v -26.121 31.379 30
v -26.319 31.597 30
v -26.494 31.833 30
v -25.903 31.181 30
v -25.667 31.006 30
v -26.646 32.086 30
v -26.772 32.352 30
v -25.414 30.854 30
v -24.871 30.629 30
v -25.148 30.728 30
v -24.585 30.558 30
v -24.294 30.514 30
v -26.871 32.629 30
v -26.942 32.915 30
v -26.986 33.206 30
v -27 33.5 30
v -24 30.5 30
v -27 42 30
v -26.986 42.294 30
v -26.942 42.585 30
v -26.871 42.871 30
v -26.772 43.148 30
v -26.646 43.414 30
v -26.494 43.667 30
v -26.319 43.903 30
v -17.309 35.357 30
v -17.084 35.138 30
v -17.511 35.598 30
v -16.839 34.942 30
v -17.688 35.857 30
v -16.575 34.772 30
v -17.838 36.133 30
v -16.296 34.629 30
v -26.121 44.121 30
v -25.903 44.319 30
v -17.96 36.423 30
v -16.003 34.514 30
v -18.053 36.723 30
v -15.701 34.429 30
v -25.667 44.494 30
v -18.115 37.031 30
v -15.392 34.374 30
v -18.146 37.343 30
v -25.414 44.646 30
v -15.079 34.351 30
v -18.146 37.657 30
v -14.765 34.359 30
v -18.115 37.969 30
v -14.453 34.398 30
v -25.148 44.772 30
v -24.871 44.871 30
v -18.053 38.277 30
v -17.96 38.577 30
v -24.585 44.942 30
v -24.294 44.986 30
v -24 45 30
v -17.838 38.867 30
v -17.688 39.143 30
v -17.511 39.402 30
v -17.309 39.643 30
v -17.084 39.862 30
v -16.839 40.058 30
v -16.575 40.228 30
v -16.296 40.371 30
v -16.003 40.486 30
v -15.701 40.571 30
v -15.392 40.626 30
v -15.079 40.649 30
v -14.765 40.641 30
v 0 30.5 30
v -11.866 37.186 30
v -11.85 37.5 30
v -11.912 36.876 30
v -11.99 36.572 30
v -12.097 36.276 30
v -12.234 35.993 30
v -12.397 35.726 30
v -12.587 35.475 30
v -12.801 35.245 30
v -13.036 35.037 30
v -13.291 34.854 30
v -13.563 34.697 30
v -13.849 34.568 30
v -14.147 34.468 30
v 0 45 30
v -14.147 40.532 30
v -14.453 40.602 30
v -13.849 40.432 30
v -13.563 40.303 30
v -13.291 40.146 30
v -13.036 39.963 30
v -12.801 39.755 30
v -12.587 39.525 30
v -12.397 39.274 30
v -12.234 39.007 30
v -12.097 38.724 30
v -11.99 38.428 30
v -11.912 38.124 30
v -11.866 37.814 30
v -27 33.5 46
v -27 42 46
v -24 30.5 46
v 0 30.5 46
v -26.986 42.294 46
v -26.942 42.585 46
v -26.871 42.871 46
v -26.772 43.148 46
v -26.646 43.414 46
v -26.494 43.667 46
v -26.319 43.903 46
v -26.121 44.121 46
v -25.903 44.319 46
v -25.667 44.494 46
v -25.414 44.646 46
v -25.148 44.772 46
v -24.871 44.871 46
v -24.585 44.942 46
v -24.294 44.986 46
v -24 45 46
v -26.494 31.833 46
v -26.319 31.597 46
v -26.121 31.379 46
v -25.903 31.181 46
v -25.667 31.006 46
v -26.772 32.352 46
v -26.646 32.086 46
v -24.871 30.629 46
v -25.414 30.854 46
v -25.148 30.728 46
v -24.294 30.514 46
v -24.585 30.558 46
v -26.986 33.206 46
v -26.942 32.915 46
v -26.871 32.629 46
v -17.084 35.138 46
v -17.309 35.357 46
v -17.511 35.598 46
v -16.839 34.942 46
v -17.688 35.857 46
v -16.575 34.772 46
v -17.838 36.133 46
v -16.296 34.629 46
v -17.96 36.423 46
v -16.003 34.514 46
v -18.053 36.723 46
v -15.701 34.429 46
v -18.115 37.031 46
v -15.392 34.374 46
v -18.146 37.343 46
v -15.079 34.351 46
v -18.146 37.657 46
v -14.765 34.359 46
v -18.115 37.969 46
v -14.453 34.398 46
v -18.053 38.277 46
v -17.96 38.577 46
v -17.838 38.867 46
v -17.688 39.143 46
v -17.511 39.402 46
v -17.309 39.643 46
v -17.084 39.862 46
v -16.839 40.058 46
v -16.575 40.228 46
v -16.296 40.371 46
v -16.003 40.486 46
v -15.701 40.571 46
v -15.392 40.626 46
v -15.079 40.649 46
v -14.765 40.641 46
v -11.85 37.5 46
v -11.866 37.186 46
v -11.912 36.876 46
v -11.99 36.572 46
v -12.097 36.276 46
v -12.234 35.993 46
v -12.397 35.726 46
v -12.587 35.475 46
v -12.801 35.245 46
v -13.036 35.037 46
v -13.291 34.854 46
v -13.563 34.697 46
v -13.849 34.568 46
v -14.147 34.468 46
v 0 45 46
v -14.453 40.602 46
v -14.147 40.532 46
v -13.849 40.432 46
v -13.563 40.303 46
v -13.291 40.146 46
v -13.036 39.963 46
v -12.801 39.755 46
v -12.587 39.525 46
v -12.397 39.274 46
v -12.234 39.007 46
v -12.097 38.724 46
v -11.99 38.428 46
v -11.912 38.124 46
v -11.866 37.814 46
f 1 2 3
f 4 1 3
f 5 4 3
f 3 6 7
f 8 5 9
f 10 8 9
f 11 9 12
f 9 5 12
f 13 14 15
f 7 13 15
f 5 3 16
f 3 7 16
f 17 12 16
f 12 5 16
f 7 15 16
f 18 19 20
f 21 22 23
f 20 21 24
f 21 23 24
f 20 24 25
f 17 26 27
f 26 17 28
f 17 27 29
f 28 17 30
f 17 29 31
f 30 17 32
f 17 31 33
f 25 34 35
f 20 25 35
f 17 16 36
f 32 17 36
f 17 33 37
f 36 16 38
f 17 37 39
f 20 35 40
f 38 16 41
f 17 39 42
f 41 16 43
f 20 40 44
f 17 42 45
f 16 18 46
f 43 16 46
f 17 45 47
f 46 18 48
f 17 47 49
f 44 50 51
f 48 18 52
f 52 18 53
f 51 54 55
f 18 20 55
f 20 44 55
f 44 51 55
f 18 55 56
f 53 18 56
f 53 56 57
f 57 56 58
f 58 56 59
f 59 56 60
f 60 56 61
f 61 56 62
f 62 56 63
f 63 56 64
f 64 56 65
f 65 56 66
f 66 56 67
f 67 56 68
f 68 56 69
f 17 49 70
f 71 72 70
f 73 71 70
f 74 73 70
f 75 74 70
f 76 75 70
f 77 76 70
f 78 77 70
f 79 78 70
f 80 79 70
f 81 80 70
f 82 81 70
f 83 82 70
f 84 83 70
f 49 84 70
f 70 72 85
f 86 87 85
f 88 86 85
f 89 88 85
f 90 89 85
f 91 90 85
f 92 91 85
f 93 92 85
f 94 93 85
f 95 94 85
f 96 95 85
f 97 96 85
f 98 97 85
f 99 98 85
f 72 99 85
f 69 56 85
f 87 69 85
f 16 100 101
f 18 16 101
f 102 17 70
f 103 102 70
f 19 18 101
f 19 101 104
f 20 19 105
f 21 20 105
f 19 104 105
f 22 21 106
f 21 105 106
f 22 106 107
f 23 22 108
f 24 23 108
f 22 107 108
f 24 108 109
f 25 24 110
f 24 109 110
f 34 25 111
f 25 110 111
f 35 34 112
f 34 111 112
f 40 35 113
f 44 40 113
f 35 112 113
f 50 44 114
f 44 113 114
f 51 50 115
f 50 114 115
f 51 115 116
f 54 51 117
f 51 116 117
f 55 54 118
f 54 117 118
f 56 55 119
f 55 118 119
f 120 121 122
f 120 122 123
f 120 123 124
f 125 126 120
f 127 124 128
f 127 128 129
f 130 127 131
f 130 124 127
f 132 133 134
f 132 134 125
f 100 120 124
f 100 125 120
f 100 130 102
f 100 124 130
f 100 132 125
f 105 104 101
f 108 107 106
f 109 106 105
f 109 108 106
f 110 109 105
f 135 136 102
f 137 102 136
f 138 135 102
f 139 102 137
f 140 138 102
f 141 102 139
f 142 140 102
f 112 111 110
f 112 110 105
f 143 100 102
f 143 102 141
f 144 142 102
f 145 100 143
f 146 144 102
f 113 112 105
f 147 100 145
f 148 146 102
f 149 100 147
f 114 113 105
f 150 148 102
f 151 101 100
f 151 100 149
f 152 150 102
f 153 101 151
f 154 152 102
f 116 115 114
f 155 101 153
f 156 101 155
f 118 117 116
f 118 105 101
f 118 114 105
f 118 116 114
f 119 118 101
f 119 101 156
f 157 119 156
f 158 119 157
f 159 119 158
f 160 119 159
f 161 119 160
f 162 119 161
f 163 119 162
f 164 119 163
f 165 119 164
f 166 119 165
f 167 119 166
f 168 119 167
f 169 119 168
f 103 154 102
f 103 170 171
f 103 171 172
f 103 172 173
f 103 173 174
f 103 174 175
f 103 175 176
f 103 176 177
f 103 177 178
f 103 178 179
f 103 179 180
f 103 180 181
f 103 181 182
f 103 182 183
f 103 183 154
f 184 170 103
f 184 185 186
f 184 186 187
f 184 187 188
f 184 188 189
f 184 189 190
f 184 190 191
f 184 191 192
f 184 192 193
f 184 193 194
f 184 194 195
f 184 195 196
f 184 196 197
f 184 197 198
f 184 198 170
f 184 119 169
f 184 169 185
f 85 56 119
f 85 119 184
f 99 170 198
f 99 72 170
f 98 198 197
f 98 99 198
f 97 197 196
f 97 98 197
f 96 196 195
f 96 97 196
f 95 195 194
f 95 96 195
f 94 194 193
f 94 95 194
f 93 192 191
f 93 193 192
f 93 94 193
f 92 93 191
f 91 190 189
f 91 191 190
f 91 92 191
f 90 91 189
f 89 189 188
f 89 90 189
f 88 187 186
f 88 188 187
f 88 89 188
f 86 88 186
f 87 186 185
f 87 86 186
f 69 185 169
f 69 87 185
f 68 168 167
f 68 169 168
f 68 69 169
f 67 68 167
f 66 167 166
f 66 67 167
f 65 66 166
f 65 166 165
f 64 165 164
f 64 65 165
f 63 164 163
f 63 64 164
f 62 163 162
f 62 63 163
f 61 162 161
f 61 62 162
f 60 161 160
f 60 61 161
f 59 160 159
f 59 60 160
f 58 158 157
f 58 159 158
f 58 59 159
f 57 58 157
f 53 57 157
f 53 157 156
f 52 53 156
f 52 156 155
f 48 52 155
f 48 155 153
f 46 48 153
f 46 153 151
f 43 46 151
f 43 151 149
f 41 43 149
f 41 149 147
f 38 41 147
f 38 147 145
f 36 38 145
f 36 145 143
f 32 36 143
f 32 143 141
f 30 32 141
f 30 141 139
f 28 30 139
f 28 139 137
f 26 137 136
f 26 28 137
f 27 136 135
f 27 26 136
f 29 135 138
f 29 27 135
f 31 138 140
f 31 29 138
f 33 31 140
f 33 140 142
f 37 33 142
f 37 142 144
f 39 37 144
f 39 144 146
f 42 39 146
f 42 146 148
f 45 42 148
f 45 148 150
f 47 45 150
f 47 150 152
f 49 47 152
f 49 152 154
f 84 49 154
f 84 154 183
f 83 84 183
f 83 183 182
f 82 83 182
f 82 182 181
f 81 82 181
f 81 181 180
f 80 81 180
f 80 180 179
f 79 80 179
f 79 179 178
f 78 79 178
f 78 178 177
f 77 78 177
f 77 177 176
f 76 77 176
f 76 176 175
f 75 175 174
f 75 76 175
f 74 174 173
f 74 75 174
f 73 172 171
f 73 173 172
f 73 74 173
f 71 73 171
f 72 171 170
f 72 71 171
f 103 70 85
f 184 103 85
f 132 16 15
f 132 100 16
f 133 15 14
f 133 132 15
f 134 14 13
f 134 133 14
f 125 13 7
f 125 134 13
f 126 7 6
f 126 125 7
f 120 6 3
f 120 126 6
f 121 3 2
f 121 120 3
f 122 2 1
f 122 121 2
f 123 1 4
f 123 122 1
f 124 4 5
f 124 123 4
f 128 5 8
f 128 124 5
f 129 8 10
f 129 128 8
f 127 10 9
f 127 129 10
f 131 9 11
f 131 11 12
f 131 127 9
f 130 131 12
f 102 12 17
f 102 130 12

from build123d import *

# Parameters (mm, degrees)
CYLINDER002_R     = 3.15
CYLINDER002_DEPTH = 24
BOX002_W          = 27
BOX002_H          = 14.5
BOX002_DEPTH      = 16
FILLET_R          = 3


with BuildPart() as cylinder002:
    # Cylinder002 → Cylinder002 (new body)
    with BuildSketch(Plane(origin=(-15, 37.5, 25), x_dir=(1, 0, 0), z_dir=(0, 0, 1))):
        Circle(CYLINDER002_R)
    extrude(amount=CYLINDER002_DEPTH)


with BuildPart() as cut002002002007004004001003:
    # Box002 → Box002 (new body)
    with BuildSketch(Plane(origin=(-27, 30.5, 30), x_dir=(1, 0, 0), z_dir=(0, 0, 1))):
        with Locations((13.5, 7.25)):
            Rectangle(BOX002_W, BOX002_H)
    extrude(amount=BOX002_DEPTH)

    # Fillet
    fillet_edges = [cut002002002007004004001003.edges().sort_by_distance(p)[0] for p in [
        (-27, 30.5, 38),
        (-27, 45, 38),
    ]]
    fillet(fillet_edges, radius=FILLET_R)

    # Cut002002002007004004001003: cut Cylinder002
    add(cylinder002.part, mode=Mode.SUBTRACT)


solid = cut002002002007004004001003.part
